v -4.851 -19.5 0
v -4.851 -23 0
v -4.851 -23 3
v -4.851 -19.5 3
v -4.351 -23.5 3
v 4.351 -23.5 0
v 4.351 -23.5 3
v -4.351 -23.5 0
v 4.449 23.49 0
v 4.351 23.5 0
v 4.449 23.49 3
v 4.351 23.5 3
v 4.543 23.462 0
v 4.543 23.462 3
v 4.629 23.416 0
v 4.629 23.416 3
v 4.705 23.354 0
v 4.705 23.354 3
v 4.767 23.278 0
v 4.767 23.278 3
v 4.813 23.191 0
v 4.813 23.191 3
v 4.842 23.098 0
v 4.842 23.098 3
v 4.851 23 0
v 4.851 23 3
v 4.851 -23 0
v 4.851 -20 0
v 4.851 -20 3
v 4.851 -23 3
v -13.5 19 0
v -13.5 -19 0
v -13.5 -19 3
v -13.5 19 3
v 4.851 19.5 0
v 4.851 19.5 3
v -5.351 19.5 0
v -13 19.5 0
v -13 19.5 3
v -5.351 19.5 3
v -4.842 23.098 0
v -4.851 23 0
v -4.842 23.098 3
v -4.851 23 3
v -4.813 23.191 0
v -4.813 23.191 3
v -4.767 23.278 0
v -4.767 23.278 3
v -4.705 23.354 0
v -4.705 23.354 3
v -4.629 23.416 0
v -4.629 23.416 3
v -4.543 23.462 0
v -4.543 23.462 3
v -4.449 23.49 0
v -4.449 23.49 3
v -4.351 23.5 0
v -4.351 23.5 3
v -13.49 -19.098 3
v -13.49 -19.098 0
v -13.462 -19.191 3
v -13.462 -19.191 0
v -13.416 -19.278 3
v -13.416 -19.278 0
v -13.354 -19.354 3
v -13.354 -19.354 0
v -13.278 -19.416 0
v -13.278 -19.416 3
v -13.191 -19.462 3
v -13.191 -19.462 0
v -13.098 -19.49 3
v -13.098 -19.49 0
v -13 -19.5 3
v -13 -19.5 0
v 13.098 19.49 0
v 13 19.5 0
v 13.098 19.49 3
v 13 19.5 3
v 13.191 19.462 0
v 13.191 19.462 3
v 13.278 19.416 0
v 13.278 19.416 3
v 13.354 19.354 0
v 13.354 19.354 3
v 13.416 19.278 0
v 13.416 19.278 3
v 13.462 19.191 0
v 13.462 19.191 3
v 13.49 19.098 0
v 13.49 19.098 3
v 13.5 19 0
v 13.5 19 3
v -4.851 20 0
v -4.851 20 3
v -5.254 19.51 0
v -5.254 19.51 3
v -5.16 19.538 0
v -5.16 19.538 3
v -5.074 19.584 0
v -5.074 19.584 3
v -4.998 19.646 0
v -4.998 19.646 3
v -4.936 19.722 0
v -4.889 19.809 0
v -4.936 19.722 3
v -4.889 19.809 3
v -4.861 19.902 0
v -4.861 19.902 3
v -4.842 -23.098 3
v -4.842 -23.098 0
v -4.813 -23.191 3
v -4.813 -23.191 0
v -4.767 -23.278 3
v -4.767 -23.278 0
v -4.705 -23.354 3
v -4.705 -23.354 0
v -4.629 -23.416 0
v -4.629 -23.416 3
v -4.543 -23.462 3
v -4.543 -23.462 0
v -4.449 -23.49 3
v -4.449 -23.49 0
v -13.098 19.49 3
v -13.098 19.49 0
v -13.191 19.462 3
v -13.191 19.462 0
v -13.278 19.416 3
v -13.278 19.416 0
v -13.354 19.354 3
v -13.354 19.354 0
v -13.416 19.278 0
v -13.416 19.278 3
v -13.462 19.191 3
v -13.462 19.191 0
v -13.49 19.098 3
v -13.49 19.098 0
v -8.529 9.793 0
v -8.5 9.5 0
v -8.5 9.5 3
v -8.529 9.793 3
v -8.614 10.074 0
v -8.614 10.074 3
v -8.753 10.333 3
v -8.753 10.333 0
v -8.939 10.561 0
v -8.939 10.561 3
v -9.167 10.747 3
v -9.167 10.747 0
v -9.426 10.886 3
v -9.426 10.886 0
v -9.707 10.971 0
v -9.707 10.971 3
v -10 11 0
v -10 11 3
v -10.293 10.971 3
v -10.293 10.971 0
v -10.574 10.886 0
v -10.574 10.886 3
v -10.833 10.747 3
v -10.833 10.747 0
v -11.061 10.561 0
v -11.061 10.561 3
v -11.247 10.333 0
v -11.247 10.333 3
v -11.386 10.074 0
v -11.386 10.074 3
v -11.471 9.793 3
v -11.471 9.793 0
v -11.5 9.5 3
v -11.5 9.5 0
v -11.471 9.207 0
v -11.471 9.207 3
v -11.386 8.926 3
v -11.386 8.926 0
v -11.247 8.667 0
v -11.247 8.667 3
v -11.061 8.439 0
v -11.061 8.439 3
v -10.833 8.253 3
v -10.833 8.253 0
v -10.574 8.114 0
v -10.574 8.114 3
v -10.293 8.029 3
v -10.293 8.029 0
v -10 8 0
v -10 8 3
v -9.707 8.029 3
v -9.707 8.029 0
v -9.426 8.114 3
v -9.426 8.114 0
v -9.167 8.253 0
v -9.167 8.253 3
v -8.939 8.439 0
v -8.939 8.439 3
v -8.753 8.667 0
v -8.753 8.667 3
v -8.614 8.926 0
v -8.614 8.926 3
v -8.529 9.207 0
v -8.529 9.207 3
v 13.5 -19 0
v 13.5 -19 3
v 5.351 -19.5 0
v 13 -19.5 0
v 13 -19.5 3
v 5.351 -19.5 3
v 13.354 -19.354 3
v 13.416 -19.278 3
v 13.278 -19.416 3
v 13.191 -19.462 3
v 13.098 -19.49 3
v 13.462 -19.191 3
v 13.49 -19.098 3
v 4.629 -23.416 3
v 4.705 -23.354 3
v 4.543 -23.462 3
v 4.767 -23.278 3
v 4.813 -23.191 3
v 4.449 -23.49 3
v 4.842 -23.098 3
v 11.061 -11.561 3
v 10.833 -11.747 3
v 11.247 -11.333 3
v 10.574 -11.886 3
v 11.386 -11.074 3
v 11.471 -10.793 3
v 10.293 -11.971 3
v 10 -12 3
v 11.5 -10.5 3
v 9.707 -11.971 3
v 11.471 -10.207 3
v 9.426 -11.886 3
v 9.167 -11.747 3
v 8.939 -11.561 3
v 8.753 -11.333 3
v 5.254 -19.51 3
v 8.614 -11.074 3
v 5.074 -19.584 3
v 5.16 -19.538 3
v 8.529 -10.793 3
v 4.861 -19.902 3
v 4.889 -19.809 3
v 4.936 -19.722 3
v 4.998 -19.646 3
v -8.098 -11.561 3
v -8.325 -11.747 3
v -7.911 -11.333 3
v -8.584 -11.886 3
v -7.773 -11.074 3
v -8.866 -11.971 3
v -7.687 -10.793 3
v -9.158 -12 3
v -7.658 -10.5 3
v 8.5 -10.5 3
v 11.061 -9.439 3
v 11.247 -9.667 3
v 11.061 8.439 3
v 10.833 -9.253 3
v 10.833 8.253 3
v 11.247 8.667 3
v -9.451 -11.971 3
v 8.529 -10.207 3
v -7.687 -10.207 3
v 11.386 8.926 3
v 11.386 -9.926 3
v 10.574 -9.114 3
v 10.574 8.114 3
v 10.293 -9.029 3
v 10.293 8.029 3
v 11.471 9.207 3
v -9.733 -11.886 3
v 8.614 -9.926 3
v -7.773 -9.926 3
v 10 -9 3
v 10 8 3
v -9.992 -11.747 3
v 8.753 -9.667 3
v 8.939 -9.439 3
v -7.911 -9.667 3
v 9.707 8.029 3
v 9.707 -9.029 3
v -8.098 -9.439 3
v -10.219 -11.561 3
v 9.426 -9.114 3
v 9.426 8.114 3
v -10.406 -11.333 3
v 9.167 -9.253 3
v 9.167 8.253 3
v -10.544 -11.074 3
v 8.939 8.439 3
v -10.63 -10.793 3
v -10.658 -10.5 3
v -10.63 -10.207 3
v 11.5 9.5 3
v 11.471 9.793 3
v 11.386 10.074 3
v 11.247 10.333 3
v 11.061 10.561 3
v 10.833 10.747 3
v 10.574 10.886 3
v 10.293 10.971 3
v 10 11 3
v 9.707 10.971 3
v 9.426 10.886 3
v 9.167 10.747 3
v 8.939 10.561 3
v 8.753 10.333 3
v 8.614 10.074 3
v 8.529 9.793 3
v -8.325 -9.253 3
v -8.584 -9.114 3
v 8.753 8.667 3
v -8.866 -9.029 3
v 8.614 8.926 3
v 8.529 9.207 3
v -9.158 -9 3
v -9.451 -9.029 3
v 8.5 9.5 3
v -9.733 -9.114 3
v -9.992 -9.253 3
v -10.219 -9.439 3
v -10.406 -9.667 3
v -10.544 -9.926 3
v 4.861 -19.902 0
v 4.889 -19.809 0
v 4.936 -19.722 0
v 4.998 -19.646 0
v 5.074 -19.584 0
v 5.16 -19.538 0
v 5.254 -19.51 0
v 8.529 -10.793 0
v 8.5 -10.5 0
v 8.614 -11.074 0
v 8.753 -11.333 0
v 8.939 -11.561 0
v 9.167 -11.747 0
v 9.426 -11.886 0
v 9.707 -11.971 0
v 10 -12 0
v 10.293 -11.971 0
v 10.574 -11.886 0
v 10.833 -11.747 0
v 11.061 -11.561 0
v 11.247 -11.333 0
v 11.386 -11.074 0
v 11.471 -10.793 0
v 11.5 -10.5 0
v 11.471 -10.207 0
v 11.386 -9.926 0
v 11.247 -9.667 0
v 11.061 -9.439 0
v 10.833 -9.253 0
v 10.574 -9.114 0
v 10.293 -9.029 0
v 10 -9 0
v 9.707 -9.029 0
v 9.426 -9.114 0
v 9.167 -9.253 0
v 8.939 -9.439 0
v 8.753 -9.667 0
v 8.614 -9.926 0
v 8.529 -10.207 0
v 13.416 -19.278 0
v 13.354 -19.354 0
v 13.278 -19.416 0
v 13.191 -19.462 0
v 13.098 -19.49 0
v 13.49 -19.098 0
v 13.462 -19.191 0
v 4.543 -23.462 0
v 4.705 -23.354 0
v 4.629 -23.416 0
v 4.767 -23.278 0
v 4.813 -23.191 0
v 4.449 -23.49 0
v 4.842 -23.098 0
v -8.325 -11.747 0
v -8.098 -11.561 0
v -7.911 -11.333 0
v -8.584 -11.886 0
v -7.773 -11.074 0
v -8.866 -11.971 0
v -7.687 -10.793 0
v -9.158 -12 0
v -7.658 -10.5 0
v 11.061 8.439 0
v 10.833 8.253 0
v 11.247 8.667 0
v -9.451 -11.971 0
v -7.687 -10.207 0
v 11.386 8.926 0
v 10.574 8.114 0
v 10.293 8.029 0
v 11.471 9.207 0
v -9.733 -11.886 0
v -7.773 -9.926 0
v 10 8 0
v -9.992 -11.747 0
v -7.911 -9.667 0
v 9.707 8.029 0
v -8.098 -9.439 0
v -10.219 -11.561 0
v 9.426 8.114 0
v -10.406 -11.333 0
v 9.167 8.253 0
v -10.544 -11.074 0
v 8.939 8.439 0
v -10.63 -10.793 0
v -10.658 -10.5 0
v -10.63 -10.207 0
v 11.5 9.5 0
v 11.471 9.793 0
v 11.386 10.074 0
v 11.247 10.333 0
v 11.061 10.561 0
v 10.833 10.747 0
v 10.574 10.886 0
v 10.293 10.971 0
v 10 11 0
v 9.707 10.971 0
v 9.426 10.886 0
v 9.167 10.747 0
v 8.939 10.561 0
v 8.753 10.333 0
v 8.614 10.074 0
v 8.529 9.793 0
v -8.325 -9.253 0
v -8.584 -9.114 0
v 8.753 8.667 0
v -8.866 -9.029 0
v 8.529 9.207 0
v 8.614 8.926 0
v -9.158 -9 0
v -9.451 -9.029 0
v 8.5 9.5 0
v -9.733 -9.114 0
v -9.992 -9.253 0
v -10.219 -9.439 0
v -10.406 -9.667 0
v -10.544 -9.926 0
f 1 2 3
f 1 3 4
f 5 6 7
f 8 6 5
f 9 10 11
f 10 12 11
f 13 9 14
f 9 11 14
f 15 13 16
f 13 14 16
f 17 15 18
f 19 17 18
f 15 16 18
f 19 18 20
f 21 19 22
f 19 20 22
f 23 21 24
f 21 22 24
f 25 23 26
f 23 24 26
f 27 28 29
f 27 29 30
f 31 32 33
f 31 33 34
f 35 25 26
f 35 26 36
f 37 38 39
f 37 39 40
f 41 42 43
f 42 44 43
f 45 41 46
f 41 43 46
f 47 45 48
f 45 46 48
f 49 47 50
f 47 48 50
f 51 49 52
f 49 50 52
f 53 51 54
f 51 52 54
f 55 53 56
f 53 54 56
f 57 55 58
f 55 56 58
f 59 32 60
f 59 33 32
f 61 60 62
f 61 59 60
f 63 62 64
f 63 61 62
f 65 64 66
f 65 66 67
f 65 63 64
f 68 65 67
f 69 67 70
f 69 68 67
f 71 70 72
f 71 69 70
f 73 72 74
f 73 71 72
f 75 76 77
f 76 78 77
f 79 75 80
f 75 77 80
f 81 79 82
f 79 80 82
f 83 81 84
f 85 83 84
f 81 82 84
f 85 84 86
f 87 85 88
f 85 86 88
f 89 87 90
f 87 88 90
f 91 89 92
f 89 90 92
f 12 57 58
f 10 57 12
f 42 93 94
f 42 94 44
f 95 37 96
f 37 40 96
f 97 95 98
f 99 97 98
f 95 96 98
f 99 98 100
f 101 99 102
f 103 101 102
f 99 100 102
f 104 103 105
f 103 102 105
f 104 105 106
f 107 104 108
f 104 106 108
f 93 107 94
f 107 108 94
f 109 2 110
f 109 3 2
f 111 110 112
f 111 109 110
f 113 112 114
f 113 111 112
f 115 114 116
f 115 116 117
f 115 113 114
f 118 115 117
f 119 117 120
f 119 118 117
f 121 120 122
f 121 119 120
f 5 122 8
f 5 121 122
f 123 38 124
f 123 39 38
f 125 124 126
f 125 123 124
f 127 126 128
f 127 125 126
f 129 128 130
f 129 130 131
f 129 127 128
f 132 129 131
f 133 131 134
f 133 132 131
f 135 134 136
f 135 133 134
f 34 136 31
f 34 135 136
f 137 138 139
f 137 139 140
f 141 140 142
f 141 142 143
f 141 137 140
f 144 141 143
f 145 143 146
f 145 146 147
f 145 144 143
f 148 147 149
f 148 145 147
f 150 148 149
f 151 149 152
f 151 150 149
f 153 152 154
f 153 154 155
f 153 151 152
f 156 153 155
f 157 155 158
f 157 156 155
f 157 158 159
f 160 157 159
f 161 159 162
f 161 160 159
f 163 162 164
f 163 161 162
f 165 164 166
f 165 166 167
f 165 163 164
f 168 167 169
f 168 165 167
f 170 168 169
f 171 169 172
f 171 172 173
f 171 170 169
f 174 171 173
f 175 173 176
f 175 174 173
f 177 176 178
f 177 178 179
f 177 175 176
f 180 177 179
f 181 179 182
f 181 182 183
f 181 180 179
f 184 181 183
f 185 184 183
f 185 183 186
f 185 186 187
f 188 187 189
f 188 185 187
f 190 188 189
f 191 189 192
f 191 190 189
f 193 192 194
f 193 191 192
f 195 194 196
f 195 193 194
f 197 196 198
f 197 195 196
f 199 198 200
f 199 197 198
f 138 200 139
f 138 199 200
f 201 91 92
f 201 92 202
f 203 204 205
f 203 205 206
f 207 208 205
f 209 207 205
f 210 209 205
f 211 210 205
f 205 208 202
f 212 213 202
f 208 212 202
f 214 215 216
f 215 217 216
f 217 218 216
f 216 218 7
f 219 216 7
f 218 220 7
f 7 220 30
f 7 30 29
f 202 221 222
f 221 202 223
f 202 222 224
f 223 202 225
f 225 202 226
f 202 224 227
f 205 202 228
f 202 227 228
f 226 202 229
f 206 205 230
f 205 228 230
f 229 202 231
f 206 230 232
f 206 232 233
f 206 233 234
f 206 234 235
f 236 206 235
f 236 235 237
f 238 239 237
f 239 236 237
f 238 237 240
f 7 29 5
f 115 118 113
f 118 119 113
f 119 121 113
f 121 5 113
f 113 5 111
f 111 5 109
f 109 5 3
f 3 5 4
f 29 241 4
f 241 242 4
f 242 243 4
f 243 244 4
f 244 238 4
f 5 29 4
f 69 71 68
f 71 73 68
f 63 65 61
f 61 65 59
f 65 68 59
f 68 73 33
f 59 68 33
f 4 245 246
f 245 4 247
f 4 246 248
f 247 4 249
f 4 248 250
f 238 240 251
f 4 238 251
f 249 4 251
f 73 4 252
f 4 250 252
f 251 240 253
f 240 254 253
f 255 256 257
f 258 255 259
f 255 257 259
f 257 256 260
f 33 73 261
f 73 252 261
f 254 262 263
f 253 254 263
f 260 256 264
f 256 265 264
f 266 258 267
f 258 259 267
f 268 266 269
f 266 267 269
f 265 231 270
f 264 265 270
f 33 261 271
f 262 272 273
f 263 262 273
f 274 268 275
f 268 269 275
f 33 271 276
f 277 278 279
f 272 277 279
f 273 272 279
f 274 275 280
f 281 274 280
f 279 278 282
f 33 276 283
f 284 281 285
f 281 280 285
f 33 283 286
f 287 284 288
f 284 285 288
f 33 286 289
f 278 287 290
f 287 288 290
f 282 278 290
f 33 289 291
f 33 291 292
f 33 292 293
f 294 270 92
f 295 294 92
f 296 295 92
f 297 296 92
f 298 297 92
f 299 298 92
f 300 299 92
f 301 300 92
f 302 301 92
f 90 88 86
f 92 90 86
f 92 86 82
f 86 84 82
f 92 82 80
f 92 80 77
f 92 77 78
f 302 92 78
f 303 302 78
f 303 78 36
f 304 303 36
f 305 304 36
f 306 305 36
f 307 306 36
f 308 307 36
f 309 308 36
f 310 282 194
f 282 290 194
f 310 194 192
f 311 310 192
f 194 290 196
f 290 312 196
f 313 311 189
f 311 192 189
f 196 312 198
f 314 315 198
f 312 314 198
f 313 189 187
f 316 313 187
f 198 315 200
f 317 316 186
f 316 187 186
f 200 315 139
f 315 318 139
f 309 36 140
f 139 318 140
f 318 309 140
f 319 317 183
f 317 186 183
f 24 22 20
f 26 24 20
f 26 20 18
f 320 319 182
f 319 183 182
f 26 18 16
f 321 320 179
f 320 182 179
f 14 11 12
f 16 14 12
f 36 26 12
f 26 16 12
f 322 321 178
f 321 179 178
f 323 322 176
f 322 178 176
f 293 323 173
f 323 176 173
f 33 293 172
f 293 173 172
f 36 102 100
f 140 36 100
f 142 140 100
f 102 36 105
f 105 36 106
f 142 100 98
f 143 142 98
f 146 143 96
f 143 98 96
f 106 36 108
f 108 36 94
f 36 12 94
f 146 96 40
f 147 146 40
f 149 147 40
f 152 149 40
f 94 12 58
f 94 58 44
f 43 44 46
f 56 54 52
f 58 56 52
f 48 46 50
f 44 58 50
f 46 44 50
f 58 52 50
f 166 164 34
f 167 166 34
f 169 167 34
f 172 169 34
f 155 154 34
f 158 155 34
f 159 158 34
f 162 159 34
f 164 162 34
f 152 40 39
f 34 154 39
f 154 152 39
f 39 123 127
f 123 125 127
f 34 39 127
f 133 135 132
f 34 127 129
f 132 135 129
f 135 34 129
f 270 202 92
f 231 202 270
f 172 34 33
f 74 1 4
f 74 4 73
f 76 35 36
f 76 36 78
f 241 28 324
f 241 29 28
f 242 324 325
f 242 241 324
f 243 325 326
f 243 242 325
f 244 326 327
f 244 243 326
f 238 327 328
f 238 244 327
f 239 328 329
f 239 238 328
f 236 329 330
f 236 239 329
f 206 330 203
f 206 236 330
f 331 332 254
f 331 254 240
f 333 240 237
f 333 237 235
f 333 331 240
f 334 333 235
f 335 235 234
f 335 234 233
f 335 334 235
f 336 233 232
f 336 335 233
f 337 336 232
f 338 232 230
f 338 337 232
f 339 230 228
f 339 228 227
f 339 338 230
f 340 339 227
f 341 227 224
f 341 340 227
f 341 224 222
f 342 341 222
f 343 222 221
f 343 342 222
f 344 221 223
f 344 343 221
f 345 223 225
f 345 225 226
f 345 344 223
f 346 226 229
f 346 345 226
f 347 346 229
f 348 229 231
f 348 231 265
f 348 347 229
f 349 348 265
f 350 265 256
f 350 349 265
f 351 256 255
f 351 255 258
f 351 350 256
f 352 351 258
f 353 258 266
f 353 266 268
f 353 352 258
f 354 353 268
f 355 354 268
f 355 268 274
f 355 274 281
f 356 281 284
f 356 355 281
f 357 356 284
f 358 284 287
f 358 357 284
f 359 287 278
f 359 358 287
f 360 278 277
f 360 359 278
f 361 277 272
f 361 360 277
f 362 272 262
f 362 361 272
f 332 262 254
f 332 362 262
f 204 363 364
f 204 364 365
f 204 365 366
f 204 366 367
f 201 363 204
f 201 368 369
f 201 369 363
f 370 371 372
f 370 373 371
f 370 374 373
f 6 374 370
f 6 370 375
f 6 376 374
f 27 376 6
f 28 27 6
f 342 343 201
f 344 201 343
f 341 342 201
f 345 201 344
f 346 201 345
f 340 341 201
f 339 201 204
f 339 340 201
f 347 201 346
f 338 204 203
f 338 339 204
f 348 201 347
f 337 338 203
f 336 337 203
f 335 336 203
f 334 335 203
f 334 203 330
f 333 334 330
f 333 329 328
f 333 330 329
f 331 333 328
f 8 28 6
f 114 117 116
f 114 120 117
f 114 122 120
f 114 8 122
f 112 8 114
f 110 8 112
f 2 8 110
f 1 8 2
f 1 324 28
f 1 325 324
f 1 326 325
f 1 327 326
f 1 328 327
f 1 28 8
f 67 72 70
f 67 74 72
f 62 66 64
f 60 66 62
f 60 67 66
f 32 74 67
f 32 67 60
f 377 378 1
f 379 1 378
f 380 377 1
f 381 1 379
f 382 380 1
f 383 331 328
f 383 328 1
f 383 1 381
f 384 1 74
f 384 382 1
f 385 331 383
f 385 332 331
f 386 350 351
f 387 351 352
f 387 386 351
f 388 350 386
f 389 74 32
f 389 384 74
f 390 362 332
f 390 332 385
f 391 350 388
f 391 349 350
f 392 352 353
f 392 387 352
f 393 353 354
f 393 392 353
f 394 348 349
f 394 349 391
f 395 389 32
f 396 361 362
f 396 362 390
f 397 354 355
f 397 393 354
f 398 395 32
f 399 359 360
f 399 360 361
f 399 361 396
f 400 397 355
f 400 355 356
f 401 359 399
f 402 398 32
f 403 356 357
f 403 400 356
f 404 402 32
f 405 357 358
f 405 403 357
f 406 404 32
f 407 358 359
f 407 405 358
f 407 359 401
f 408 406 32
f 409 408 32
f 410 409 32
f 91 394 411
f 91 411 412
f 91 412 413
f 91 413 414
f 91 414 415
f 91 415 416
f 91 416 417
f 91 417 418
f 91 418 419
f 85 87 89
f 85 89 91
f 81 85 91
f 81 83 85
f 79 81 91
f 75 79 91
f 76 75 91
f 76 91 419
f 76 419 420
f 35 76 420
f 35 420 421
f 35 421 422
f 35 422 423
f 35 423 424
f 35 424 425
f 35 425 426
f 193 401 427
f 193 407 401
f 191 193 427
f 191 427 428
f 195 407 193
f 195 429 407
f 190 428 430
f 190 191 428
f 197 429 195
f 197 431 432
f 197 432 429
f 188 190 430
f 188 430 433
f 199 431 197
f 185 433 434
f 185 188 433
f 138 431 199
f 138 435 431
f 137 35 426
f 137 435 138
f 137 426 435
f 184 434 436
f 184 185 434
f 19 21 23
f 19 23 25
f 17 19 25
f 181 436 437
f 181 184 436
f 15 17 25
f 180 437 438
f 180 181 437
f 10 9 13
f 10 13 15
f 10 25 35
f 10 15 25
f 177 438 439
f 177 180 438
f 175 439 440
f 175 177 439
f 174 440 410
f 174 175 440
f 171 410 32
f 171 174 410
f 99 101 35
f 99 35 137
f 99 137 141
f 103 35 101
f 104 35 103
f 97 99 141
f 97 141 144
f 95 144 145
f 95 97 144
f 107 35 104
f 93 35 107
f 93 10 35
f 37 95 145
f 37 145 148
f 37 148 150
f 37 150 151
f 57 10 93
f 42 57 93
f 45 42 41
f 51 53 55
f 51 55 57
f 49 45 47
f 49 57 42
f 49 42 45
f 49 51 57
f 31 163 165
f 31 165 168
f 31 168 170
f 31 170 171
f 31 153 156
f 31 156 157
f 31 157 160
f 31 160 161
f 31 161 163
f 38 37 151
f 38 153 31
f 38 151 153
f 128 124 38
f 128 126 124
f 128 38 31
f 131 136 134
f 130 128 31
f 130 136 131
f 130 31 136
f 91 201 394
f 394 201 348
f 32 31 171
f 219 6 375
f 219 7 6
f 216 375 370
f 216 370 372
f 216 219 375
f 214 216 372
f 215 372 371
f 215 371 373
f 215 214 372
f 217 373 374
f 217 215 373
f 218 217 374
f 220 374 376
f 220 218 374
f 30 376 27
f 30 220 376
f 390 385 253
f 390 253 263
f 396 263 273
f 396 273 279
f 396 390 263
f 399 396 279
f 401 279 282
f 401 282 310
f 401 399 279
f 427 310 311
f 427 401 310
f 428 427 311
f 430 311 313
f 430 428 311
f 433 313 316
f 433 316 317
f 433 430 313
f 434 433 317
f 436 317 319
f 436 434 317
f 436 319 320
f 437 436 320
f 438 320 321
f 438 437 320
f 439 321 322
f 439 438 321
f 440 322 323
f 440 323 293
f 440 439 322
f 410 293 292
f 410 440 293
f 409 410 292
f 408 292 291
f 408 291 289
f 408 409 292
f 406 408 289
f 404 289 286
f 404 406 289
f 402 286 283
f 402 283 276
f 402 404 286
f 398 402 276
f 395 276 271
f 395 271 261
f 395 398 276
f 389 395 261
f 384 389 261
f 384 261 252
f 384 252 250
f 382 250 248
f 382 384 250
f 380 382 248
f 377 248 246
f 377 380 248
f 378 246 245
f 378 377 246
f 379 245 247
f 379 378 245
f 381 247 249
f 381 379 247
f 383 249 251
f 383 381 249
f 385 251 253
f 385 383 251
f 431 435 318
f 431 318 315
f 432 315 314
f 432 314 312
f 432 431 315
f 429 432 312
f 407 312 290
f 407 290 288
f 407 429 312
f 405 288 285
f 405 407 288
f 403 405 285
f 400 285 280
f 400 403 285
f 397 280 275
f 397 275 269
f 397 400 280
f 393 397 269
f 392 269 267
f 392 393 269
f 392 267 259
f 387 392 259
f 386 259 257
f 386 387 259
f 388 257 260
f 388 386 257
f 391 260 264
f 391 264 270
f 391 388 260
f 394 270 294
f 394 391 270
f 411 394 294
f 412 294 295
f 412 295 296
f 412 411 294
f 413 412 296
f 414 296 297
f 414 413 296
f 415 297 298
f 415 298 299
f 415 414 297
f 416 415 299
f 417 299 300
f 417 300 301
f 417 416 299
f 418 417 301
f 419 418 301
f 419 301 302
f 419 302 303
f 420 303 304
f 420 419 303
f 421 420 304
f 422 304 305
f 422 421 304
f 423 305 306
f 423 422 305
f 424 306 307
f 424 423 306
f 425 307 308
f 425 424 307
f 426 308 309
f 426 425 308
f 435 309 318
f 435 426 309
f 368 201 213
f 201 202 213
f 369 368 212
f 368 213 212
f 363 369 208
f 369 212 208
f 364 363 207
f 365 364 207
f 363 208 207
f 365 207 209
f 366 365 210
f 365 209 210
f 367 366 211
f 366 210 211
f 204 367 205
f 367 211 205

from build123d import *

# Parameters (mm, degrees)
ESQUISSE1_R        = 1.5
BOSS_EXTRU_1_DEPTH = 3
CONG_1_R           = 0.5


with BuildPart() as part:
    # Esquisse1 → Boss.-Extru.1 (new body)
    with BuildSketch(Plane.XY):
        Polygon((-13.5, 19.5), (-4.85133507, 19.5), (-4.85133507, 23.5), (4.85133507, 23.5), (4.85133507, 19.5), (13.5, 19.5), (13.5, -19.5), (4.85133507, -19.5), (4.85133507, -23.5), (-4.85133507, -23.5), (-4.85133507, -19.5), (-13.5, -19.5), align=None)
        with Locations((-10, 9.5)):
            Circle(ESQUISSE1_R, mode=Mode.SUBTRACT)
        with Locations(Location((10, 9.5, 0), (0, 0, 180))):
            Circle(ESQUISSE1_R, mode=Mode.SUBTRACT)
        with Locations((-9.158491979, -10.5)):
            Circle(ESQUISSE1_R, mode=Mode.SUBTRACT)
        with Locations(Location((10, -10.5, 0), (0, 0, 180))):
            Circle(ESQUISSE1_R, mode=Mode.SUBTRACT)
    extrude(amount=BOSS_EXTRU_1_DEPTH)

    # Congé1
    cong_1_edges = [part.edges().sort_by_distance(p)[0] for p in [
        (-13.5, 19.5, 1.5),
        (-4.85133507, 19.5, 1.5),
        (-4.85133507, 23.5, 1.5),
        (4.85133507, 23.5, 1.5),
        (13.5, 19.5, 1.5),
        (13.5, -19.5, 1.5),
        (4.85133507, -19.5, 1.5),
        (4.85133507, -23.5, 1.5),
        (-4.85133507, -23.5, 1.5),
        (-13.5, -19.5, 1.5),
    ]]
    fillet(cong_1_edges, radius=CONG_1_R)


solid = part.part
